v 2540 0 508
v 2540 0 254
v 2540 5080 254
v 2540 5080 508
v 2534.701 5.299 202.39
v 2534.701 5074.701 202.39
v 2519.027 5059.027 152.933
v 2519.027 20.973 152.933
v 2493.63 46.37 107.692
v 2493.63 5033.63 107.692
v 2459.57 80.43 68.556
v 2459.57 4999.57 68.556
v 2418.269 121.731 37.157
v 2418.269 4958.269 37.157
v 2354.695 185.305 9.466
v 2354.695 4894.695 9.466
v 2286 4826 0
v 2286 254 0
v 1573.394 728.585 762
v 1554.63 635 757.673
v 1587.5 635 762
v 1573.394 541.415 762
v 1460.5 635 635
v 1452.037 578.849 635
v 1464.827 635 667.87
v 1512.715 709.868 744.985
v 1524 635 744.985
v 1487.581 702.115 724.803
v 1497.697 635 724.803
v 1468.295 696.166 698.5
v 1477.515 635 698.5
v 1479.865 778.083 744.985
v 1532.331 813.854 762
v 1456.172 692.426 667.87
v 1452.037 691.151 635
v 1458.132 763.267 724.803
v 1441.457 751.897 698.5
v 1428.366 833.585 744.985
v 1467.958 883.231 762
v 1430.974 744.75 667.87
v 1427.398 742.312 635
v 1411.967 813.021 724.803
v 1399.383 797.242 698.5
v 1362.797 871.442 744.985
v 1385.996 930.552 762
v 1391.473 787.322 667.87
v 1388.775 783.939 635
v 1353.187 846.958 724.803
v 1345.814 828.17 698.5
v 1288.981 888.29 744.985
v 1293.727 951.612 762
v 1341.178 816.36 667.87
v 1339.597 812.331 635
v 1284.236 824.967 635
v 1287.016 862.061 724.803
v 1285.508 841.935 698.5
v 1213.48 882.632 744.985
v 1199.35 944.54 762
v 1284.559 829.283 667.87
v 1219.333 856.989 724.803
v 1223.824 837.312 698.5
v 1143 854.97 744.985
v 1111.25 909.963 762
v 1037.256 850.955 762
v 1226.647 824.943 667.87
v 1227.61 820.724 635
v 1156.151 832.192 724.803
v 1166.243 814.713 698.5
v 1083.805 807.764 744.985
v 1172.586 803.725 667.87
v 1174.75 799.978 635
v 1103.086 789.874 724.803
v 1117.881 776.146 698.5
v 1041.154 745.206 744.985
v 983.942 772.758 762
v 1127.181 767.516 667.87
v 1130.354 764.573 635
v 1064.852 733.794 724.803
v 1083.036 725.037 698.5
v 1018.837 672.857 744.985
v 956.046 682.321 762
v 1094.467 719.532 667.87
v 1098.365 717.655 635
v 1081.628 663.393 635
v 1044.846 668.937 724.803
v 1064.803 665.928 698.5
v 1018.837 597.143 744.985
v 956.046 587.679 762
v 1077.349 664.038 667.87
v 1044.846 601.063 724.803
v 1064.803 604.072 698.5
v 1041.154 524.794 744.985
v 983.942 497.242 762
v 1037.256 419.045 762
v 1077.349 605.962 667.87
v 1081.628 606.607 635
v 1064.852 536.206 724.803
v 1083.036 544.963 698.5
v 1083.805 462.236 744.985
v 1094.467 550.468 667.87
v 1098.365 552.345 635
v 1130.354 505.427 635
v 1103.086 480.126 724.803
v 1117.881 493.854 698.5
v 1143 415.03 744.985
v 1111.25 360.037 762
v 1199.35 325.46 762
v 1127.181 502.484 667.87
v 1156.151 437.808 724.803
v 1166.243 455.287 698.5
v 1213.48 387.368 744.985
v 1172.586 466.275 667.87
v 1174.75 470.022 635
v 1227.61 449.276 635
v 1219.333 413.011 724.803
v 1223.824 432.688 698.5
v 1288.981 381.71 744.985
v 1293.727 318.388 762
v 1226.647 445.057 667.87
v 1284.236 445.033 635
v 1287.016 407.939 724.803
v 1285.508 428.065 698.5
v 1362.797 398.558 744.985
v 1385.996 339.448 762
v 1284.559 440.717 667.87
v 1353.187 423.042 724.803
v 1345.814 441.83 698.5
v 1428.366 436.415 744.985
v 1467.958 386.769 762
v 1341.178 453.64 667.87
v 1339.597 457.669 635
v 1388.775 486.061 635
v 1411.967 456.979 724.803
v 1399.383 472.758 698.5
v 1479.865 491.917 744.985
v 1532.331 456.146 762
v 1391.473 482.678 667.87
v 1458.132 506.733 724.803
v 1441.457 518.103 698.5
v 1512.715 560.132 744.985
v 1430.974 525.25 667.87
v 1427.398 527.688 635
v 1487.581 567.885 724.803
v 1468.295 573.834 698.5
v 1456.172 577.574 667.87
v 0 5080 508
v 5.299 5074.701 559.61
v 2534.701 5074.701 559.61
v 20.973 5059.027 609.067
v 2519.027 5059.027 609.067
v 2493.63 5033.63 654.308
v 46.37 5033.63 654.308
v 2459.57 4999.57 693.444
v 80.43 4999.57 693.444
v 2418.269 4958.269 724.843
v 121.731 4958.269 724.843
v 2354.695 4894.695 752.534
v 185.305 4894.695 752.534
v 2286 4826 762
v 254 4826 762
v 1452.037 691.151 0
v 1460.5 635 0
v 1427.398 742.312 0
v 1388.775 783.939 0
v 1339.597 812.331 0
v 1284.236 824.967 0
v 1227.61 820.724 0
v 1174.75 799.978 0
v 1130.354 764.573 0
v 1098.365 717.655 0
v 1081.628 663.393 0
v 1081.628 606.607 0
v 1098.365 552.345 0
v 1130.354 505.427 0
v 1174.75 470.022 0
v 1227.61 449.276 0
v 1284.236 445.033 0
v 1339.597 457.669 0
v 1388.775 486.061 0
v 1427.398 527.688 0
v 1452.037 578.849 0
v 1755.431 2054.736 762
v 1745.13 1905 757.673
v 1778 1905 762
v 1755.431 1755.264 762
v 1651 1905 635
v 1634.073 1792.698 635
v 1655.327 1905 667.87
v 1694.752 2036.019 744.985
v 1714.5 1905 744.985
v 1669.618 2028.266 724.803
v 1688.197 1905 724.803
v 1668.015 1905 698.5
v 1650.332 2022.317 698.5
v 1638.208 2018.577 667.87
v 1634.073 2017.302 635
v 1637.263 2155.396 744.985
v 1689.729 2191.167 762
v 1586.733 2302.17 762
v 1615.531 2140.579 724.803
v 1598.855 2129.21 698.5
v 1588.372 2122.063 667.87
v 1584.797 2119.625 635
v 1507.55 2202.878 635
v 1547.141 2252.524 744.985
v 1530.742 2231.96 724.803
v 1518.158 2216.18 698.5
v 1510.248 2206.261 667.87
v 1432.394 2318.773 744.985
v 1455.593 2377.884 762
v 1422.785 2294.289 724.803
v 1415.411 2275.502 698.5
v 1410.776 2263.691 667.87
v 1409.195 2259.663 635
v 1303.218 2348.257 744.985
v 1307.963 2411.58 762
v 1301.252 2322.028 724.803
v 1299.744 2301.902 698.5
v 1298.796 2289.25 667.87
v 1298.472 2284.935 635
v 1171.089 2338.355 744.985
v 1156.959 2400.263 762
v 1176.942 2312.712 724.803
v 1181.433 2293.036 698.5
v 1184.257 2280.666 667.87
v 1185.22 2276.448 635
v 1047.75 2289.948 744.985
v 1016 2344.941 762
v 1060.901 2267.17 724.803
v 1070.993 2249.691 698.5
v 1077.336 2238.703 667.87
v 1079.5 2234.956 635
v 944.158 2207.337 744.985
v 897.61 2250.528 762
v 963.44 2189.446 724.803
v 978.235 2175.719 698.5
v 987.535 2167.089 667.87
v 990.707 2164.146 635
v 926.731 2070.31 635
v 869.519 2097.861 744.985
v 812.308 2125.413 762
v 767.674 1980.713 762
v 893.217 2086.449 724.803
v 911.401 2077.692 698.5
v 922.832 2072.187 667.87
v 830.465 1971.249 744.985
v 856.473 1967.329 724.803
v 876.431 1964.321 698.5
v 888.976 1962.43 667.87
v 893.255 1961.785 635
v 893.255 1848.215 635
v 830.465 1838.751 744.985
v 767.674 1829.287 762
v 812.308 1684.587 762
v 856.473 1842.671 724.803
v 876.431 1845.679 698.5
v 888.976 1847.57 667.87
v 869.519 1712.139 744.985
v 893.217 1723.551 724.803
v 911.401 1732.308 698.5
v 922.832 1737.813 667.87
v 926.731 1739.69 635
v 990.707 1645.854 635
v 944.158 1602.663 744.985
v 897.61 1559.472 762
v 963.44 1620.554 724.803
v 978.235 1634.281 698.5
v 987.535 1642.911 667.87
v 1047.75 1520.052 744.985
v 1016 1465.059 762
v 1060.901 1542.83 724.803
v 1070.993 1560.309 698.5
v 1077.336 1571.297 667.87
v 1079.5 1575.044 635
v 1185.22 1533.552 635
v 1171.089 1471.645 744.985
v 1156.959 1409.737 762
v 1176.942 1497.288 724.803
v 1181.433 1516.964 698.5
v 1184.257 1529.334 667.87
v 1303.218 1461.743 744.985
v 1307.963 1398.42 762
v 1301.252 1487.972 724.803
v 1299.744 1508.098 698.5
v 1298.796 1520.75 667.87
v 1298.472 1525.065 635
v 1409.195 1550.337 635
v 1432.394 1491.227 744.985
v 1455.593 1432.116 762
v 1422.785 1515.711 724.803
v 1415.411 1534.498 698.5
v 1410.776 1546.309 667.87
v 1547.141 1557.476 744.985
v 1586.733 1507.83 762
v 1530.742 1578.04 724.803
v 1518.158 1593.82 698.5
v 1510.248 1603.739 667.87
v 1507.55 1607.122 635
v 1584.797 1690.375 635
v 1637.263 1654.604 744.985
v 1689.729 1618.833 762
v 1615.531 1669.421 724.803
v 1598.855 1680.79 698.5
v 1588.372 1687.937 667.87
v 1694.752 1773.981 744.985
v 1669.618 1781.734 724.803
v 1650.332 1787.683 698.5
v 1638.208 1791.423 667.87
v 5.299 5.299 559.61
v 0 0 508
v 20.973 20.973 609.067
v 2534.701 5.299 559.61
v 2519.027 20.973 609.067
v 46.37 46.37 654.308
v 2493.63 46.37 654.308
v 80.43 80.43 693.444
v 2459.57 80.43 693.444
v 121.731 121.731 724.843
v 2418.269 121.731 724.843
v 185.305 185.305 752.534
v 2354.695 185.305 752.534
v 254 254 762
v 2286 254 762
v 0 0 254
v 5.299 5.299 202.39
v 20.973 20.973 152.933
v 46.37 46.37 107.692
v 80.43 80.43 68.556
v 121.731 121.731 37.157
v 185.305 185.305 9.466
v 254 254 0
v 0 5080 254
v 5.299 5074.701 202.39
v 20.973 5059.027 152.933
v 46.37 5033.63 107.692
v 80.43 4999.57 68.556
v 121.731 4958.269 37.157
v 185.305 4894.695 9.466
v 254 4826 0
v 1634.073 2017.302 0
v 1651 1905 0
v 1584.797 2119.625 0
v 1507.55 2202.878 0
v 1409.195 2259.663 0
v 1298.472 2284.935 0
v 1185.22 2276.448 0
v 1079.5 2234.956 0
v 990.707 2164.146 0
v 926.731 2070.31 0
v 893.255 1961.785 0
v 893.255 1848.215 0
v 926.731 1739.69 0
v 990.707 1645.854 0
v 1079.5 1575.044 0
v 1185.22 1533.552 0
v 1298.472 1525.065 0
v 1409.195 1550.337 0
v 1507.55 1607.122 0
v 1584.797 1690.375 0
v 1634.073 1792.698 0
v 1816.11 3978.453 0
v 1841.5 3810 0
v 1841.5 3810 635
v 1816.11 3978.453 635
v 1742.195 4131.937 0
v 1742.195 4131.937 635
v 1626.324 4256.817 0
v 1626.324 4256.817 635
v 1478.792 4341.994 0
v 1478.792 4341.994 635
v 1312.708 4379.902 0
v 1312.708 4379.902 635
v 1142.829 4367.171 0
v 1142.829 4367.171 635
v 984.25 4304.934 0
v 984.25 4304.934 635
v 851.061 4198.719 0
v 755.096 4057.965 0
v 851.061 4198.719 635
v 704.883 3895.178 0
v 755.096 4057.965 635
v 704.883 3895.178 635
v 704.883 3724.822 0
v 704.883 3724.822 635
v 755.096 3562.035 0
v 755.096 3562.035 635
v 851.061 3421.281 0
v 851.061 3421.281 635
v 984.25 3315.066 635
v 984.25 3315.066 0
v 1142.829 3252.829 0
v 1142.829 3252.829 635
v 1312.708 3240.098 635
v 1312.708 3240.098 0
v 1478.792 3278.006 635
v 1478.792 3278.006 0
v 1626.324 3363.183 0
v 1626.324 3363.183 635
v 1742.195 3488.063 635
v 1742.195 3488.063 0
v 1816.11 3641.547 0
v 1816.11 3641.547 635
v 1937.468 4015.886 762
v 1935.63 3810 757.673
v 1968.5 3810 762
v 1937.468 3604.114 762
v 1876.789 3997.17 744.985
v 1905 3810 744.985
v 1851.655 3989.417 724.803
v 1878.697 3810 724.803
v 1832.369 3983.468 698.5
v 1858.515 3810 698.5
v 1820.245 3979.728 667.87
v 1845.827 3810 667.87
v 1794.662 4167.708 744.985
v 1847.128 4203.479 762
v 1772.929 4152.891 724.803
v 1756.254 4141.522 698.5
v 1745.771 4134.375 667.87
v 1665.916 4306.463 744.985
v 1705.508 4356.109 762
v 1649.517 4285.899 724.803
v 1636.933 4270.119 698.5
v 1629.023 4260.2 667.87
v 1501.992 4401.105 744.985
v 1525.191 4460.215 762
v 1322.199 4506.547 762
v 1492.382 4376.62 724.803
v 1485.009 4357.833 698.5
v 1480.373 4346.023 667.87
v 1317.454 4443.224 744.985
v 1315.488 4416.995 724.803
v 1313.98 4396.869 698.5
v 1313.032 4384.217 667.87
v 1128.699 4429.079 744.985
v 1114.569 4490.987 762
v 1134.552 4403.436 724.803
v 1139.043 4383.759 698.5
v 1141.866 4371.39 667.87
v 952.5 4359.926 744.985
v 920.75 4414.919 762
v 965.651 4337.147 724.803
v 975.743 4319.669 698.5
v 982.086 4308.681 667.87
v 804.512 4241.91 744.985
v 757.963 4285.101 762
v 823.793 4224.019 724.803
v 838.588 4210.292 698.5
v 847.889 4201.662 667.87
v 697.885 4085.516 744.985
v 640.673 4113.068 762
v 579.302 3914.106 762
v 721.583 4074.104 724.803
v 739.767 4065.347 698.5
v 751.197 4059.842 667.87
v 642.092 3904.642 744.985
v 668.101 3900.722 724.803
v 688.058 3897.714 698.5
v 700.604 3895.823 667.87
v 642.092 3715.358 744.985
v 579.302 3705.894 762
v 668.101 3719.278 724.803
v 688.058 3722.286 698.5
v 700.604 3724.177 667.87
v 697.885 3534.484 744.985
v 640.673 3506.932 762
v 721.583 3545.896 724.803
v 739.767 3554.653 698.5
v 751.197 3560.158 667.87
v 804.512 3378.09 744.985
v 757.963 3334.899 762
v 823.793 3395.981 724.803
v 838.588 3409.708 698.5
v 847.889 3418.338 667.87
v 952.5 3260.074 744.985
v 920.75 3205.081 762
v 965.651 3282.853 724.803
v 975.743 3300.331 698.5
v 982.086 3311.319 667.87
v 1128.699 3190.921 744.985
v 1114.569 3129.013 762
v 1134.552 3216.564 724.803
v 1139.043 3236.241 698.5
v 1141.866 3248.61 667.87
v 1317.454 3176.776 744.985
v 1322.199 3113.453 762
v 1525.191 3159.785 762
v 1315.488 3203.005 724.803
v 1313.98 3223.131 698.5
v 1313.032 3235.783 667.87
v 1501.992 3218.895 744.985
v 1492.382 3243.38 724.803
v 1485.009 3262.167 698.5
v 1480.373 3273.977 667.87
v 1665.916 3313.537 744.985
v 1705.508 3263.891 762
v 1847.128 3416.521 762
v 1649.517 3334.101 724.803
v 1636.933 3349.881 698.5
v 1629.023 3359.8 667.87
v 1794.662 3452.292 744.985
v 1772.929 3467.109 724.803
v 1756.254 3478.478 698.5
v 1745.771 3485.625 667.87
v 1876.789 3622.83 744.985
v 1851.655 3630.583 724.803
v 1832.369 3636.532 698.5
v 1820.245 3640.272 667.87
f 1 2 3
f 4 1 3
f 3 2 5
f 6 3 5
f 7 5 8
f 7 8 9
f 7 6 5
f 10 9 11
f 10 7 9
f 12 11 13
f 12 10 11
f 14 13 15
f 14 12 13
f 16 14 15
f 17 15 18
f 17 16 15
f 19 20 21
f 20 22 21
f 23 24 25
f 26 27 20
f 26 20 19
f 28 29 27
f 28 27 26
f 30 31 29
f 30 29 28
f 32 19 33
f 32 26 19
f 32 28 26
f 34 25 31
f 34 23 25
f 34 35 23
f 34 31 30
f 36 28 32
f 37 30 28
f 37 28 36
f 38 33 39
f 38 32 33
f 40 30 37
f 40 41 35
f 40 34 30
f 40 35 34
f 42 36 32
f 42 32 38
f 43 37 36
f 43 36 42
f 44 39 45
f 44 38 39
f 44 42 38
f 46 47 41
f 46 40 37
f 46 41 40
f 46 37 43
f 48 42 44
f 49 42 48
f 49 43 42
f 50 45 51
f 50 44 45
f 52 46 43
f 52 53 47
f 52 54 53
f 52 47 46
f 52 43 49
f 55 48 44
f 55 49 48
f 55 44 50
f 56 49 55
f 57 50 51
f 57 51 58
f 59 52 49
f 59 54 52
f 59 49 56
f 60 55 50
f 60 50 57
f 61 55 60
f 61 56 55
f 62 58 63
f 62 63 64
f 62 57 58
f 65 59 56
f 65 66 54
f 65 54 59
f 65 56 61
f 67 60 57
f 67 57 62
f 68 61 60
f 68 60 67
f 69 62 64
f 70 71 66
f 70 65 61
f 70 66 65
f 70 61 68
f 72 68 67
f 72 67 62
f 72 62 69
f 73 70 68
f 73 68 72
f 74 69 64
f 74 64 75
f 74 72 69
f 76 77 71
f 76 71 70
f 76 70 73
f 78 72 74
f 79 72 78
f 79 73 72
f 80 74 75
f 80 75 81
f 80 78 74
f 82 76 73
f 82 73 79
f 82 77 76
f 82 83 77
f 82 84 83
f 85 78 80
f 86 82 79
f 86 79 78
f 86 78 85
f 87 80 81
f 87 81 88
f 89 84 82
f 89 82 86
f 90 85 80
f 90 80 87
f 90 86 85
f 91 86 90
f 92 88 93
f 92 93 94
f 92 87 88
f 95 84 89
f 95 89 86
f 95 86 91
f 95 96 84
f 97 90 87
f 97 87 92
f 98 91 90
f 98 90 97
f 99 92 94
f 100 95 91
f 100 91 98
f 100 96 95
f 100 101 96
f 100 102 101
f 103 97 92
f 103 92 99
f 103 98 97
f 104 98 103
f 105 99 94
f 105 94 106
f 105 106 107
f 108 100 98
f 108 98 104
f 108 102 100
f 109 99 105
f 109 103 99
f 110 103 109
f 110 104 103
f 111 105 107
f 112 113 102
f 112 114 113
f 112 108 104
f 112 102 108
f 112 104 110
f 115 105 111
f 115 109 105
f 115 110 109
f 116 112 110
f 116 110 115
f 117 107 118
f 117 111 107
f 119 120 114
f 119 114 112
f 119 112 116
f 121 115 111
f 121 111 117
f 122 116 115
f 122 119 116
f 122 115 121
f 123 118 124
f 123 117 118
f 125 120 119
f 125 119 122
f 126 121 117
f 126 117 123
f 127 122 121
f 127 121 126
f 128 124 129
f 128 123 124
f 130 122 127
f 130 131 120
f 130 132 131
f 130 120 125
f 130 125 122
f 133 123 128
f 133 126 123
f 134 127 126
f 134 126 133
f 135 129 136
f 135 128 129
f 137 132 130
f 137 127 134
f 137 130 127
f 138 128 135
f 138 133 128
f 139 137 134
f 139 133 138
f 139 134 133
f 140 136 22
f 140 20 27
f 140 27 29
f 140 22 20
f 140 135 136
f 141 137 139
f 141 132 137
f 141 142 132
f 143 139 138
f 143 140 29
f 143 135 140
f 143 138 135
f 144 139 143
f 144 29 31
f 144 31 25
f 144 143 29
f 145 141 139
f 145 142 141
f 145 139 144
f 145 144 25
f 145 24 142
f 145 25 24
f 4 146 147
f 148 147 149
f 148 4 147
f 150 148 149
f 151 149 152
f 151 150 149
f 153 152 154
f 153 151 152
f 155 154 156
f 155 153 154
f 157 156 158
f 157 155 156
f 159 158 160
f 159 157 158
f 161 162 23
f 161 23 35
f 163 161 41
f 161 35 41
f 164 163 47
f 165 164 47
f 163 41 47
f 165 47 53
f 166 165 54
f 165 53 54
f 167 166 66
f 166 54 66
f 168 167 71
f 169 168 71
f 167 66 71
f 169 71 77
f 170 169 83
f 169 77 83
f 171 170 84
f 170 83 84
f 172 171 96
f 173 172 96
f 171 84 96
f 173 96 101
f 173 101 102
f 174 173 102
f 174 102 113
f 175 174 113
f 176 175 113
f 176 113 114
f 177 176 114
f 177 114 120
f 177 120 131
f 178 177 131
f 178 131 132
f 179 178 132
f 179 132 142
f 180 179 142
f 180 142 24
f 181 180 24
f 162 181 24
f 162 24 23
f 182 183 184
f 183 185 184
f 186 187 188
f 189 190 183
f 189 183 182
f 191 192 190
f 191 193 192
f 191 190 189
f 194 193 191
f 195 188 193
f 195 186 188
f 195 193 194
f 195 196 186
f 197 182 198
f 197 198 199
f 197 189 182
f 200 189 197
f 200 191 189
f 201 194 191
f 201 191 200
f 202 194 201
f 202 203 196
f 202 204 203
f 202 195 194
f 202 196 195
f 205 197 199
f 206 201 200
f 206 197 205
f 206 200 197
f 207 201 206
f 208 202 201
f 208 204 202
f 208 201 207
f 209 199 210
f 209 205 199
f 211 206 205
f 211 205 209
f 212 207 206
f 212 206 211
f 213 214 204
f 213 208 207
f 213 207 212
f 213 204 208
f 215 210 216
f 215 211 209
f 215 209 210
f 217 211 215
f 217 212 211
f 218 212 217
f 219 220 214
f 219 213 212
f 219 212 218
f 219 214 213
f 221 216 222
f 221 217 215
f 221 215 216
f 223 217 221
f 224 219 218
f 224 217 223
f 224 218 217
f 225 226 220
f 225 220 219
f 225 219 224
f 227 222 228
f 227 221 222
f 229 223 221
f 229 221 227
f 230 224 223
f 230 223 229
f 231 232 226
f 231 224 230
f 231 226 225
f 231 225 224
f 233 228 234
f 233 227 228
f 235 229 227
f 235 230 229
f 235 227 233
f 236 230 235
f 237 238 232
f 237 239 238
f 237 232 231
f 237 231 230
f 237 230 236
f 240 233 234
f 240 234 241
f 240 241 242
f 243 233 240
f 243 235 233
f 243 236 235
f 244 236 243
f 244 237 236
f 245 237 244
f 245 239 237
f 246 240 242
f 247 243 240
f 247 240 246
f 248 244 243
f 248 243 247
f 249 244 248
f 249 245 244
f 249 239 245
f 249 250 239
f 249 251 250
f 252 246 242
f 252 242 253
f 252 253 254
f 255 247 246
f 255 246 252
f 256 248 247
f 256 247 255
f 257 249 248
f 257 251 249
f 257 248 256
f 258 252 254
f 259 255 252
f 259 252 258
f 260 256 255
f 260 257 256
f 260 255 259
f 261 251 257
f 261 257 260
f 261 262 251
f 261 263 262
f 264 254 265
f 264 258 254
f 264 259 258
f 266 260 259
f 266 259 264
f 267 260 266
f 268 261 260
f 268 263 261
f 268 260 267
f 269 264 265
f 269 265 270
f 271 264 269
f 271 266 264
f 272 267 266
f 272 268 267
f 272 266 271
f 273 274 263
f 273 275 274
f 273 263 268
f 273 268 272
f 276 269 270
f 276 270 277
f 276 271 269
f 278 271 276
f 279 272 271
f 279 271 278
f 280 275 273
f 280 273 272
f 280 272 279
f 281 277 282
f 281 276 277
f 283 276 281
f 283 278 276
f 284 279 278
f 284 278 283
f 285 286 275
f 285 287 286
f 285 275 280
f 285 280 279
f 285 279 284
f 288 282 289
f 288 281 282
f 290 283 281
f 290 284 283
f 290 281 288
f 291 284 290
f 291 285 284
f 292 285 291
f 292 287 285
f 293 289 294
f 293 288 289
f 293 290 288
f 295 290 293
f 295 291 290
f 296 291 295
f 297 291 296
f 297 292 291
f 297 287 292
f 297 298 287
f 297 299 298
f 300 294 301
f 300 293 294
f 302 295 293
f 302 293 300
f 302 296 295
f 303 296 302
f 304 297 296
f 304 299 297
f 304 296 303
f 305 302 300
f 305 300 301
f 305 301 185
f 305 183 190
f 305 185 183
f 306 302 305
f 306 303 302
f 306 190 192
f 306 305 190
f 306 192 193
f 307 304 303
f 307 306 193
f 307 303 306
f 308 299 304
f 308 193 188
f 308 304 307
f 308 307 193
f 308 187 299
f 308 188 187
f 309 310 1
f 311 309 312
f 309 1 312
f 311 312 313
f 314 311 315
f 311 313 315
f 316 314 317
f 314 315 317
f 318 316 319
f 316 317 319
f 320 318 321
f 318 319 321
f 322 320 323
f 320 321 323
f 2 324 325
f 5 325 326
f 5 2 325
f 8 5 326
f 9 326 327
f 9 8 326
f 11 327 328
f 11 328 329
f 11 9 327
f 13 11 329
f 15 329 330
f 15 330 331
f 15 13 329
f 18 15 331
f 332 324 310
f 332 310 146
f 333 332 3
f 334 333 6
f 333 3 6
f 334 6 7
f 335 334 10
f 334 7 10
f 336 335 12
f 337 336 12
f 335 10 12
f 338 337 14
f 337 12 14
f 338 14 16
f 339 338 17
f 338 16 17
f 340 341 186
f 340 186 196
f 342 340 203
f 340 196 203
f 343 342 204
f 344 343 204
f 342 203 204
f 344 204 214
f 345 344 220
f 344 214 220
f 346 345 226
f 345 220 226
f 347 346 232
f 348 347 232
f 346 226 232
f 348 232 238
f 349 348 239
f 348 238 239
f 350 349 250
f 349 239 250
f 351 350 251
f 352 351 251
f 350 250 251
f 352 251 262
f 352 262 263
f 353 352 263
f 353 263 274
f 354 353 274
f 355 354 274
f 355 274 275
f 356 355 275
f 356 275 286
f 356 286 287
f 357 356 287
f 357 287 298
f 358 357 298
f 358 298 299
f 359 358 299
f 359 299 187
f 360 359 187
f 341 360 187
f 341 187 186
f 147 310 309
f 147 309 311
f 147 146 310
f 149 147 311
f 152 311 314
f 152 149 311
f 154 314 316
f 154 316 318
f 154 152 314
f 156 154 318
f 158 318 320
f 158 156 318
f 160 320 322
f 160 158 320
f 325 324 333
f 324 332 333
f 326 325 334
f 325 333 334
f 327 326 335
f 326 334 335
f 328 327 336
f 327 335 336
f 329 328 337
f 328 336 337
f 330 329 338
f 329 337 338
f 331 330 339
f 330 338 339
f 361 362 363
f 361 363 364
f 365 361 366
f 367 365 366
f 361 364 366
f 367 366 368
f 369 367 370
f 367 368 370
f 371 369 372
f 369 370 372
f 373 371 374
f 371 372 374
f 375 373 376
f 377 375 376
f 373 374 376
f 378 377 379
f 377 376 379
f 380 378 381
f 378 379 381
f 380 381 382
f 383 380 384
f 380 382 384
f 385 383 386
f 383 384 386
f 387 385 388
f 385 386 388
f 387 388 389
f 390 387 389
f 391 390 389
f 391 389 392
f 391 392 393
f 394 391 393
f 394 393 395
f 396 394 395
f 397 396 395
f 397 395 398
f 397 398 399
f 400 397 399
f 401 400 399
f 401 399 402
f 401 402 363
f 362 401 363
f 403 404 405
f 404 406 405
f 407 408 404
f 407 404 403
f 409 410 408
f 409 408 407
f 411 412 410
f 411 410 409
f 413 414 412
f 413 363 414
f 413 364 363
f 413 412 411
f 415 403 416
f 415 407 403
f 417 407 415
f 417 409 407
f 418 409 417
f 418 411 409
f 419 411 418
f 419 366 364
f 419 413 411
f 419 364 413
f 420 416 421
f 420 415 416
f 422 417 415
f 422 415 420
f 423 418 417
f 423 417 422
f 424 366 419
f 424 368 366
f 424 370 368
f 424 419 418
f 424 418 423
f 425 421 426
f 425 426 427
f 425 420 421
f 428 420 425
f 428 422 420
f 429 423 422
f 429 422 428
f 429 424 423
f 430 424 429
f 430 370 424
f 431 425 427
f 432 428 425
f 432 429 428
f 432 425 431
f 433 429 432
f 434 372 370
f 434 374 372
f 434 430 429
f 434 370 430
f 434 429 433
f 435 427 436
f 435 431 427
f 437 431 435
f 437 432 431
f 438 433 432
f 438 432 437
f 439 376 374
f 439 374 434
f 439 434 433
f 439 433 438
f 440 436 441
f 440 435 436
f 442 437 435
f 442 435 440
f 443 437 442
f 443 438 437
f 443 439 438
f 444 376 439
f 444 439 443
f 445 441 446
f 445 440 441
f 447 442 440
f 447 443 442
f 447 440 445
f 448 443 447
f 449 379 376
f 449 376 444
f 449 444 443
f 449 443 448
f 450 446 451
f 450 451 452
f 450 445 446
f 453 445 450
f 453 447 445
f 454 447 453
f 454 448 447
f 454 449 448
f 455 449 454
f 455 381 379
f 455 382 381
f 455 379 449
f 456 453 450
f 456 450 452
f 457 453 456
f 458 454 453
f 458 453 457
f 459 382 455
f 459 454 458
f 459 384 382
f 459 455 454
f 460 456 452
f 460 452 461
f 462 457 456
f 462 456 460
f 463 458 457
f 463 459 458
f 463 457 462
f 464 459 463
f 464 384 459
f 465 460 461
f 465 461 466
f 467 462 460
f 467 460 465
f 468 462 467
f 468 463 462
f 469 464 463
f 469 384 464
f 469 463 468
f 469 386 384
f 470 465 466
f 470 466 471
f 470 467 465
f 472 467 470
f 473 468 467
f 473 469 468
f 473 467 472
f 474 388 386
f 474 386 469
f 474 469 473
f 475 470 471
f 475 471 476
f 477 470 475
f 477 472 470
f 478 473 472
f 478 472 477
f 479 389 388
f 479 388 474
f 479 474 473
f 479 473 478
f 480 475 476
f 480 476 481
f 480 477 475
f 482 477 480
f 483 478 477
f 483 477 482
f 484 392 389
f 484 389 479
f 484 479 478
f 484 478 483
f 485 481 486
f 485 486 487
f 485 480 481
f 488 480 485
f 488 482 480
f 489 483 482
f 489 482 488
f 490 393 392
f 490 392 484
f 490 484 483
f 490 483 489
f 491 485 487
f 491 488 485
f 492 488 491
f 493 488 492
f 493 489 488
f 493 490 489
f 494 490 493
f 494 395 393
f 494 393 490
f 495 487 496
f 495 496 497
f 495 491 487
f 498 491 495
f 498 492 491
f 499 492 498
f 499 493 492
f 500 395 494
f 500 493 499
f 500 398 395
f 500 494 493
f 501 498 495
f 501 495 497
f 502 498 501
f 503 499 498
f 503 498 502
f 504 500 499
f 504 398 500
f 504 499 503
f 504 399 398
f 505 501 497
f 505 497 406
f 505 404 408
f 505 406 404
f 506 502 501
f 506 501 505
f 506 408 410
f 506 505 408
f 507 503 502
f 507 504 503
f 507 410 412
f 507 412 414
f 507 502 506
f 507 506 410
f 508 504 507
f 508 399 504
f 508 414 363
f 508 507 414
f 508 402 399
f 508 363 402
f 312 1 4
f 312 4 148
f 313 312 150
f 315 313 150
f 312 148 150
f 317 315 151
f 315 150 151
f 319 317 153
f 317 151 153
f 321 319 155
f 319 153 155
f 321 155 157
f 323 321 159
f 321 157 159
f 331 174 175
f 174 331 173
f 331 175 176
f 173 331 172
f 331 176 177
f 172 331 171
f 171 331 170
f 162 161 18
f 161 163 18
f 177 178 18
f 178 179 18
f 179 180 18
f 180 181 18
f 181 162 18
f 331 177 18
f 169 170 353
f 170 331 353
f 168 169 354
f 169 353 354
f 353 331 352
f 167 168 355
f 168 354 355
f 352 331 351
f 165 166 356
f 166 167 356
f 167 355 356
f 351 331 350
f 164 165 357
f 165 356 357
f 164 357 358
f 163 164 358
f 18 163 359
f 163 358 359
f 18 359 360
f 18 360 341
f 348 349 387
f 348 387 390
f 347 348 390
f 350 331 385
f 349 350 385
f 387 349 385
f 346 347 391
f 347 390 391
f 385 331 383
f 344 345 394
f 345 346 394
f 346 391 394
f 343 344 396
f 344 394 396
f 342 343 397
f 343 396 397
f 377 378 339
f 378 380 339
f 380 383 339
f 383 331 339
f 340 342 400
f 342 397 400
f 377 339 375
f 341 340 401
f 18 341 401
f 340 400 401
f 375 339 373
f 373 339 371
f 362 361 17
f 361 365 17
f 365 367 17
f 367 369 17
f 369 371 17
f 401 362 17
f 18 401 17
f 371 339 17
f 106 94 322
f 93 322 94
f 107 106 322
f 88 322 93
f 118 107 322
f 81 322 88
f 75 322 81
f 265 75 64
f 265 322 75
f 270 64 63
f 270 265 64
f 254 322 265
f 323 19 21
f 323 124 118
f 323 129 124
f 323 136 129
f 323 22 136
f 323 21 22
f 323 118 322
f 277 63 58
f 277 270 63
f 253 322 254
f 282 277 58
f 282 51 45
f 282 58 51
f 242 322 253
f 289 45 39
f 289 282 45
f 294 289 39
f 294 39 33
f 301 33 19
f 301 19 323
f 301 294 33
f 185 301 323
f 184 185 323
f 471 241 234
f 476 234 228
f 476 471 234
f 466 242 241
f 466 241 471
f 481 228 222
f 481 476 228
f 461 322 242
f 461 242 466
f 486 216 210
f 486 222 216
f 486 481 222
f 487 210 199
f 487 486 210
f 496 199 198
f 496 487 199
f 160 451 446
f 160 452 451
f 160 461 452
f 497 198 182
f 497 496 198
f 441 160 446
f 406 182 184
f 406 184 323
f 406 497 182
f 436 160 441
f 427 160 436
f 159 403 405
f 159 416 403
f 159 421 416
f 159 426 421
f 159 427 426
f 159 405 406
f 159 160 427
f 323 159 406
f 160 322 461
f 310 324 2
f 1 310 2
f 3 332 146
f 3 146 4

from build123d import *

# Parameters (mm, degrees)
SKETCH1_W           = 2540
SKETCH1_H           = 5080
BOSS_EXTRUDE1_DEPTH = 762
FILLET1_R           = 254
SKETCH2_R           = 190.5
SKETCH2_R_2         = 381
SKETCH2_R_3         = 571.5
CUT_EXTRUDE1_DEPTH  = 5731.501199721
FILLET2_R           = 127


with BuildPart() as part:
    # Sketch1 → Boss-Extrude1 (new body)
    with BuildSketch(Plane.XY):
        with Locations((1270, 2540)):
            Rectangle(SKETCH1_W, SKETCH1_H)
    extrude(amount=BOSS_EXTRUDE1_DEPTH)

    # Fillet1
    fillet1_edges = [part.edges().sort_by_distance(p)[0] for p in [
        (2540, 2540, 762),
        (1270, 5080, 762),
        (0, 2540, 762),
        (1270, 5080, 0),
        (2540, 2540, 0),
        (1270, 0, 0),
        (0, 2540, 0),
        (1270, 0, 762),
    ]]
    fillet(fillet1_edges, radius=FILLET1_R)

    # Sketch2 → Cut-Extrude1 (cut, through all)
    with BuildSketch(Plane.XY.offset(762)):
        with Locations((1270, 635)):
            Circle(SKETCH2_R)
        with Locations((1270, 1905)):
            Circle(SKETCH2_R_2)
        with Locations((1270, 3810)):
            Circle(SKETCH2_R_3)
    extrude(amount=-CUT_EXTRUDE1_DEPTH, mode=Mode.SUBTRACT)

    # Fillet2
    fillet2_edges = [part.edges().sort_by_distance(p)[0] for p in [
        (1079.5, 635, 762),
        (889, 1905, 762),
        (698.5, 3810, 762),
    ]]
    fillet(fillet2_edges, radius=FILLET2_R)


solid = part.part
